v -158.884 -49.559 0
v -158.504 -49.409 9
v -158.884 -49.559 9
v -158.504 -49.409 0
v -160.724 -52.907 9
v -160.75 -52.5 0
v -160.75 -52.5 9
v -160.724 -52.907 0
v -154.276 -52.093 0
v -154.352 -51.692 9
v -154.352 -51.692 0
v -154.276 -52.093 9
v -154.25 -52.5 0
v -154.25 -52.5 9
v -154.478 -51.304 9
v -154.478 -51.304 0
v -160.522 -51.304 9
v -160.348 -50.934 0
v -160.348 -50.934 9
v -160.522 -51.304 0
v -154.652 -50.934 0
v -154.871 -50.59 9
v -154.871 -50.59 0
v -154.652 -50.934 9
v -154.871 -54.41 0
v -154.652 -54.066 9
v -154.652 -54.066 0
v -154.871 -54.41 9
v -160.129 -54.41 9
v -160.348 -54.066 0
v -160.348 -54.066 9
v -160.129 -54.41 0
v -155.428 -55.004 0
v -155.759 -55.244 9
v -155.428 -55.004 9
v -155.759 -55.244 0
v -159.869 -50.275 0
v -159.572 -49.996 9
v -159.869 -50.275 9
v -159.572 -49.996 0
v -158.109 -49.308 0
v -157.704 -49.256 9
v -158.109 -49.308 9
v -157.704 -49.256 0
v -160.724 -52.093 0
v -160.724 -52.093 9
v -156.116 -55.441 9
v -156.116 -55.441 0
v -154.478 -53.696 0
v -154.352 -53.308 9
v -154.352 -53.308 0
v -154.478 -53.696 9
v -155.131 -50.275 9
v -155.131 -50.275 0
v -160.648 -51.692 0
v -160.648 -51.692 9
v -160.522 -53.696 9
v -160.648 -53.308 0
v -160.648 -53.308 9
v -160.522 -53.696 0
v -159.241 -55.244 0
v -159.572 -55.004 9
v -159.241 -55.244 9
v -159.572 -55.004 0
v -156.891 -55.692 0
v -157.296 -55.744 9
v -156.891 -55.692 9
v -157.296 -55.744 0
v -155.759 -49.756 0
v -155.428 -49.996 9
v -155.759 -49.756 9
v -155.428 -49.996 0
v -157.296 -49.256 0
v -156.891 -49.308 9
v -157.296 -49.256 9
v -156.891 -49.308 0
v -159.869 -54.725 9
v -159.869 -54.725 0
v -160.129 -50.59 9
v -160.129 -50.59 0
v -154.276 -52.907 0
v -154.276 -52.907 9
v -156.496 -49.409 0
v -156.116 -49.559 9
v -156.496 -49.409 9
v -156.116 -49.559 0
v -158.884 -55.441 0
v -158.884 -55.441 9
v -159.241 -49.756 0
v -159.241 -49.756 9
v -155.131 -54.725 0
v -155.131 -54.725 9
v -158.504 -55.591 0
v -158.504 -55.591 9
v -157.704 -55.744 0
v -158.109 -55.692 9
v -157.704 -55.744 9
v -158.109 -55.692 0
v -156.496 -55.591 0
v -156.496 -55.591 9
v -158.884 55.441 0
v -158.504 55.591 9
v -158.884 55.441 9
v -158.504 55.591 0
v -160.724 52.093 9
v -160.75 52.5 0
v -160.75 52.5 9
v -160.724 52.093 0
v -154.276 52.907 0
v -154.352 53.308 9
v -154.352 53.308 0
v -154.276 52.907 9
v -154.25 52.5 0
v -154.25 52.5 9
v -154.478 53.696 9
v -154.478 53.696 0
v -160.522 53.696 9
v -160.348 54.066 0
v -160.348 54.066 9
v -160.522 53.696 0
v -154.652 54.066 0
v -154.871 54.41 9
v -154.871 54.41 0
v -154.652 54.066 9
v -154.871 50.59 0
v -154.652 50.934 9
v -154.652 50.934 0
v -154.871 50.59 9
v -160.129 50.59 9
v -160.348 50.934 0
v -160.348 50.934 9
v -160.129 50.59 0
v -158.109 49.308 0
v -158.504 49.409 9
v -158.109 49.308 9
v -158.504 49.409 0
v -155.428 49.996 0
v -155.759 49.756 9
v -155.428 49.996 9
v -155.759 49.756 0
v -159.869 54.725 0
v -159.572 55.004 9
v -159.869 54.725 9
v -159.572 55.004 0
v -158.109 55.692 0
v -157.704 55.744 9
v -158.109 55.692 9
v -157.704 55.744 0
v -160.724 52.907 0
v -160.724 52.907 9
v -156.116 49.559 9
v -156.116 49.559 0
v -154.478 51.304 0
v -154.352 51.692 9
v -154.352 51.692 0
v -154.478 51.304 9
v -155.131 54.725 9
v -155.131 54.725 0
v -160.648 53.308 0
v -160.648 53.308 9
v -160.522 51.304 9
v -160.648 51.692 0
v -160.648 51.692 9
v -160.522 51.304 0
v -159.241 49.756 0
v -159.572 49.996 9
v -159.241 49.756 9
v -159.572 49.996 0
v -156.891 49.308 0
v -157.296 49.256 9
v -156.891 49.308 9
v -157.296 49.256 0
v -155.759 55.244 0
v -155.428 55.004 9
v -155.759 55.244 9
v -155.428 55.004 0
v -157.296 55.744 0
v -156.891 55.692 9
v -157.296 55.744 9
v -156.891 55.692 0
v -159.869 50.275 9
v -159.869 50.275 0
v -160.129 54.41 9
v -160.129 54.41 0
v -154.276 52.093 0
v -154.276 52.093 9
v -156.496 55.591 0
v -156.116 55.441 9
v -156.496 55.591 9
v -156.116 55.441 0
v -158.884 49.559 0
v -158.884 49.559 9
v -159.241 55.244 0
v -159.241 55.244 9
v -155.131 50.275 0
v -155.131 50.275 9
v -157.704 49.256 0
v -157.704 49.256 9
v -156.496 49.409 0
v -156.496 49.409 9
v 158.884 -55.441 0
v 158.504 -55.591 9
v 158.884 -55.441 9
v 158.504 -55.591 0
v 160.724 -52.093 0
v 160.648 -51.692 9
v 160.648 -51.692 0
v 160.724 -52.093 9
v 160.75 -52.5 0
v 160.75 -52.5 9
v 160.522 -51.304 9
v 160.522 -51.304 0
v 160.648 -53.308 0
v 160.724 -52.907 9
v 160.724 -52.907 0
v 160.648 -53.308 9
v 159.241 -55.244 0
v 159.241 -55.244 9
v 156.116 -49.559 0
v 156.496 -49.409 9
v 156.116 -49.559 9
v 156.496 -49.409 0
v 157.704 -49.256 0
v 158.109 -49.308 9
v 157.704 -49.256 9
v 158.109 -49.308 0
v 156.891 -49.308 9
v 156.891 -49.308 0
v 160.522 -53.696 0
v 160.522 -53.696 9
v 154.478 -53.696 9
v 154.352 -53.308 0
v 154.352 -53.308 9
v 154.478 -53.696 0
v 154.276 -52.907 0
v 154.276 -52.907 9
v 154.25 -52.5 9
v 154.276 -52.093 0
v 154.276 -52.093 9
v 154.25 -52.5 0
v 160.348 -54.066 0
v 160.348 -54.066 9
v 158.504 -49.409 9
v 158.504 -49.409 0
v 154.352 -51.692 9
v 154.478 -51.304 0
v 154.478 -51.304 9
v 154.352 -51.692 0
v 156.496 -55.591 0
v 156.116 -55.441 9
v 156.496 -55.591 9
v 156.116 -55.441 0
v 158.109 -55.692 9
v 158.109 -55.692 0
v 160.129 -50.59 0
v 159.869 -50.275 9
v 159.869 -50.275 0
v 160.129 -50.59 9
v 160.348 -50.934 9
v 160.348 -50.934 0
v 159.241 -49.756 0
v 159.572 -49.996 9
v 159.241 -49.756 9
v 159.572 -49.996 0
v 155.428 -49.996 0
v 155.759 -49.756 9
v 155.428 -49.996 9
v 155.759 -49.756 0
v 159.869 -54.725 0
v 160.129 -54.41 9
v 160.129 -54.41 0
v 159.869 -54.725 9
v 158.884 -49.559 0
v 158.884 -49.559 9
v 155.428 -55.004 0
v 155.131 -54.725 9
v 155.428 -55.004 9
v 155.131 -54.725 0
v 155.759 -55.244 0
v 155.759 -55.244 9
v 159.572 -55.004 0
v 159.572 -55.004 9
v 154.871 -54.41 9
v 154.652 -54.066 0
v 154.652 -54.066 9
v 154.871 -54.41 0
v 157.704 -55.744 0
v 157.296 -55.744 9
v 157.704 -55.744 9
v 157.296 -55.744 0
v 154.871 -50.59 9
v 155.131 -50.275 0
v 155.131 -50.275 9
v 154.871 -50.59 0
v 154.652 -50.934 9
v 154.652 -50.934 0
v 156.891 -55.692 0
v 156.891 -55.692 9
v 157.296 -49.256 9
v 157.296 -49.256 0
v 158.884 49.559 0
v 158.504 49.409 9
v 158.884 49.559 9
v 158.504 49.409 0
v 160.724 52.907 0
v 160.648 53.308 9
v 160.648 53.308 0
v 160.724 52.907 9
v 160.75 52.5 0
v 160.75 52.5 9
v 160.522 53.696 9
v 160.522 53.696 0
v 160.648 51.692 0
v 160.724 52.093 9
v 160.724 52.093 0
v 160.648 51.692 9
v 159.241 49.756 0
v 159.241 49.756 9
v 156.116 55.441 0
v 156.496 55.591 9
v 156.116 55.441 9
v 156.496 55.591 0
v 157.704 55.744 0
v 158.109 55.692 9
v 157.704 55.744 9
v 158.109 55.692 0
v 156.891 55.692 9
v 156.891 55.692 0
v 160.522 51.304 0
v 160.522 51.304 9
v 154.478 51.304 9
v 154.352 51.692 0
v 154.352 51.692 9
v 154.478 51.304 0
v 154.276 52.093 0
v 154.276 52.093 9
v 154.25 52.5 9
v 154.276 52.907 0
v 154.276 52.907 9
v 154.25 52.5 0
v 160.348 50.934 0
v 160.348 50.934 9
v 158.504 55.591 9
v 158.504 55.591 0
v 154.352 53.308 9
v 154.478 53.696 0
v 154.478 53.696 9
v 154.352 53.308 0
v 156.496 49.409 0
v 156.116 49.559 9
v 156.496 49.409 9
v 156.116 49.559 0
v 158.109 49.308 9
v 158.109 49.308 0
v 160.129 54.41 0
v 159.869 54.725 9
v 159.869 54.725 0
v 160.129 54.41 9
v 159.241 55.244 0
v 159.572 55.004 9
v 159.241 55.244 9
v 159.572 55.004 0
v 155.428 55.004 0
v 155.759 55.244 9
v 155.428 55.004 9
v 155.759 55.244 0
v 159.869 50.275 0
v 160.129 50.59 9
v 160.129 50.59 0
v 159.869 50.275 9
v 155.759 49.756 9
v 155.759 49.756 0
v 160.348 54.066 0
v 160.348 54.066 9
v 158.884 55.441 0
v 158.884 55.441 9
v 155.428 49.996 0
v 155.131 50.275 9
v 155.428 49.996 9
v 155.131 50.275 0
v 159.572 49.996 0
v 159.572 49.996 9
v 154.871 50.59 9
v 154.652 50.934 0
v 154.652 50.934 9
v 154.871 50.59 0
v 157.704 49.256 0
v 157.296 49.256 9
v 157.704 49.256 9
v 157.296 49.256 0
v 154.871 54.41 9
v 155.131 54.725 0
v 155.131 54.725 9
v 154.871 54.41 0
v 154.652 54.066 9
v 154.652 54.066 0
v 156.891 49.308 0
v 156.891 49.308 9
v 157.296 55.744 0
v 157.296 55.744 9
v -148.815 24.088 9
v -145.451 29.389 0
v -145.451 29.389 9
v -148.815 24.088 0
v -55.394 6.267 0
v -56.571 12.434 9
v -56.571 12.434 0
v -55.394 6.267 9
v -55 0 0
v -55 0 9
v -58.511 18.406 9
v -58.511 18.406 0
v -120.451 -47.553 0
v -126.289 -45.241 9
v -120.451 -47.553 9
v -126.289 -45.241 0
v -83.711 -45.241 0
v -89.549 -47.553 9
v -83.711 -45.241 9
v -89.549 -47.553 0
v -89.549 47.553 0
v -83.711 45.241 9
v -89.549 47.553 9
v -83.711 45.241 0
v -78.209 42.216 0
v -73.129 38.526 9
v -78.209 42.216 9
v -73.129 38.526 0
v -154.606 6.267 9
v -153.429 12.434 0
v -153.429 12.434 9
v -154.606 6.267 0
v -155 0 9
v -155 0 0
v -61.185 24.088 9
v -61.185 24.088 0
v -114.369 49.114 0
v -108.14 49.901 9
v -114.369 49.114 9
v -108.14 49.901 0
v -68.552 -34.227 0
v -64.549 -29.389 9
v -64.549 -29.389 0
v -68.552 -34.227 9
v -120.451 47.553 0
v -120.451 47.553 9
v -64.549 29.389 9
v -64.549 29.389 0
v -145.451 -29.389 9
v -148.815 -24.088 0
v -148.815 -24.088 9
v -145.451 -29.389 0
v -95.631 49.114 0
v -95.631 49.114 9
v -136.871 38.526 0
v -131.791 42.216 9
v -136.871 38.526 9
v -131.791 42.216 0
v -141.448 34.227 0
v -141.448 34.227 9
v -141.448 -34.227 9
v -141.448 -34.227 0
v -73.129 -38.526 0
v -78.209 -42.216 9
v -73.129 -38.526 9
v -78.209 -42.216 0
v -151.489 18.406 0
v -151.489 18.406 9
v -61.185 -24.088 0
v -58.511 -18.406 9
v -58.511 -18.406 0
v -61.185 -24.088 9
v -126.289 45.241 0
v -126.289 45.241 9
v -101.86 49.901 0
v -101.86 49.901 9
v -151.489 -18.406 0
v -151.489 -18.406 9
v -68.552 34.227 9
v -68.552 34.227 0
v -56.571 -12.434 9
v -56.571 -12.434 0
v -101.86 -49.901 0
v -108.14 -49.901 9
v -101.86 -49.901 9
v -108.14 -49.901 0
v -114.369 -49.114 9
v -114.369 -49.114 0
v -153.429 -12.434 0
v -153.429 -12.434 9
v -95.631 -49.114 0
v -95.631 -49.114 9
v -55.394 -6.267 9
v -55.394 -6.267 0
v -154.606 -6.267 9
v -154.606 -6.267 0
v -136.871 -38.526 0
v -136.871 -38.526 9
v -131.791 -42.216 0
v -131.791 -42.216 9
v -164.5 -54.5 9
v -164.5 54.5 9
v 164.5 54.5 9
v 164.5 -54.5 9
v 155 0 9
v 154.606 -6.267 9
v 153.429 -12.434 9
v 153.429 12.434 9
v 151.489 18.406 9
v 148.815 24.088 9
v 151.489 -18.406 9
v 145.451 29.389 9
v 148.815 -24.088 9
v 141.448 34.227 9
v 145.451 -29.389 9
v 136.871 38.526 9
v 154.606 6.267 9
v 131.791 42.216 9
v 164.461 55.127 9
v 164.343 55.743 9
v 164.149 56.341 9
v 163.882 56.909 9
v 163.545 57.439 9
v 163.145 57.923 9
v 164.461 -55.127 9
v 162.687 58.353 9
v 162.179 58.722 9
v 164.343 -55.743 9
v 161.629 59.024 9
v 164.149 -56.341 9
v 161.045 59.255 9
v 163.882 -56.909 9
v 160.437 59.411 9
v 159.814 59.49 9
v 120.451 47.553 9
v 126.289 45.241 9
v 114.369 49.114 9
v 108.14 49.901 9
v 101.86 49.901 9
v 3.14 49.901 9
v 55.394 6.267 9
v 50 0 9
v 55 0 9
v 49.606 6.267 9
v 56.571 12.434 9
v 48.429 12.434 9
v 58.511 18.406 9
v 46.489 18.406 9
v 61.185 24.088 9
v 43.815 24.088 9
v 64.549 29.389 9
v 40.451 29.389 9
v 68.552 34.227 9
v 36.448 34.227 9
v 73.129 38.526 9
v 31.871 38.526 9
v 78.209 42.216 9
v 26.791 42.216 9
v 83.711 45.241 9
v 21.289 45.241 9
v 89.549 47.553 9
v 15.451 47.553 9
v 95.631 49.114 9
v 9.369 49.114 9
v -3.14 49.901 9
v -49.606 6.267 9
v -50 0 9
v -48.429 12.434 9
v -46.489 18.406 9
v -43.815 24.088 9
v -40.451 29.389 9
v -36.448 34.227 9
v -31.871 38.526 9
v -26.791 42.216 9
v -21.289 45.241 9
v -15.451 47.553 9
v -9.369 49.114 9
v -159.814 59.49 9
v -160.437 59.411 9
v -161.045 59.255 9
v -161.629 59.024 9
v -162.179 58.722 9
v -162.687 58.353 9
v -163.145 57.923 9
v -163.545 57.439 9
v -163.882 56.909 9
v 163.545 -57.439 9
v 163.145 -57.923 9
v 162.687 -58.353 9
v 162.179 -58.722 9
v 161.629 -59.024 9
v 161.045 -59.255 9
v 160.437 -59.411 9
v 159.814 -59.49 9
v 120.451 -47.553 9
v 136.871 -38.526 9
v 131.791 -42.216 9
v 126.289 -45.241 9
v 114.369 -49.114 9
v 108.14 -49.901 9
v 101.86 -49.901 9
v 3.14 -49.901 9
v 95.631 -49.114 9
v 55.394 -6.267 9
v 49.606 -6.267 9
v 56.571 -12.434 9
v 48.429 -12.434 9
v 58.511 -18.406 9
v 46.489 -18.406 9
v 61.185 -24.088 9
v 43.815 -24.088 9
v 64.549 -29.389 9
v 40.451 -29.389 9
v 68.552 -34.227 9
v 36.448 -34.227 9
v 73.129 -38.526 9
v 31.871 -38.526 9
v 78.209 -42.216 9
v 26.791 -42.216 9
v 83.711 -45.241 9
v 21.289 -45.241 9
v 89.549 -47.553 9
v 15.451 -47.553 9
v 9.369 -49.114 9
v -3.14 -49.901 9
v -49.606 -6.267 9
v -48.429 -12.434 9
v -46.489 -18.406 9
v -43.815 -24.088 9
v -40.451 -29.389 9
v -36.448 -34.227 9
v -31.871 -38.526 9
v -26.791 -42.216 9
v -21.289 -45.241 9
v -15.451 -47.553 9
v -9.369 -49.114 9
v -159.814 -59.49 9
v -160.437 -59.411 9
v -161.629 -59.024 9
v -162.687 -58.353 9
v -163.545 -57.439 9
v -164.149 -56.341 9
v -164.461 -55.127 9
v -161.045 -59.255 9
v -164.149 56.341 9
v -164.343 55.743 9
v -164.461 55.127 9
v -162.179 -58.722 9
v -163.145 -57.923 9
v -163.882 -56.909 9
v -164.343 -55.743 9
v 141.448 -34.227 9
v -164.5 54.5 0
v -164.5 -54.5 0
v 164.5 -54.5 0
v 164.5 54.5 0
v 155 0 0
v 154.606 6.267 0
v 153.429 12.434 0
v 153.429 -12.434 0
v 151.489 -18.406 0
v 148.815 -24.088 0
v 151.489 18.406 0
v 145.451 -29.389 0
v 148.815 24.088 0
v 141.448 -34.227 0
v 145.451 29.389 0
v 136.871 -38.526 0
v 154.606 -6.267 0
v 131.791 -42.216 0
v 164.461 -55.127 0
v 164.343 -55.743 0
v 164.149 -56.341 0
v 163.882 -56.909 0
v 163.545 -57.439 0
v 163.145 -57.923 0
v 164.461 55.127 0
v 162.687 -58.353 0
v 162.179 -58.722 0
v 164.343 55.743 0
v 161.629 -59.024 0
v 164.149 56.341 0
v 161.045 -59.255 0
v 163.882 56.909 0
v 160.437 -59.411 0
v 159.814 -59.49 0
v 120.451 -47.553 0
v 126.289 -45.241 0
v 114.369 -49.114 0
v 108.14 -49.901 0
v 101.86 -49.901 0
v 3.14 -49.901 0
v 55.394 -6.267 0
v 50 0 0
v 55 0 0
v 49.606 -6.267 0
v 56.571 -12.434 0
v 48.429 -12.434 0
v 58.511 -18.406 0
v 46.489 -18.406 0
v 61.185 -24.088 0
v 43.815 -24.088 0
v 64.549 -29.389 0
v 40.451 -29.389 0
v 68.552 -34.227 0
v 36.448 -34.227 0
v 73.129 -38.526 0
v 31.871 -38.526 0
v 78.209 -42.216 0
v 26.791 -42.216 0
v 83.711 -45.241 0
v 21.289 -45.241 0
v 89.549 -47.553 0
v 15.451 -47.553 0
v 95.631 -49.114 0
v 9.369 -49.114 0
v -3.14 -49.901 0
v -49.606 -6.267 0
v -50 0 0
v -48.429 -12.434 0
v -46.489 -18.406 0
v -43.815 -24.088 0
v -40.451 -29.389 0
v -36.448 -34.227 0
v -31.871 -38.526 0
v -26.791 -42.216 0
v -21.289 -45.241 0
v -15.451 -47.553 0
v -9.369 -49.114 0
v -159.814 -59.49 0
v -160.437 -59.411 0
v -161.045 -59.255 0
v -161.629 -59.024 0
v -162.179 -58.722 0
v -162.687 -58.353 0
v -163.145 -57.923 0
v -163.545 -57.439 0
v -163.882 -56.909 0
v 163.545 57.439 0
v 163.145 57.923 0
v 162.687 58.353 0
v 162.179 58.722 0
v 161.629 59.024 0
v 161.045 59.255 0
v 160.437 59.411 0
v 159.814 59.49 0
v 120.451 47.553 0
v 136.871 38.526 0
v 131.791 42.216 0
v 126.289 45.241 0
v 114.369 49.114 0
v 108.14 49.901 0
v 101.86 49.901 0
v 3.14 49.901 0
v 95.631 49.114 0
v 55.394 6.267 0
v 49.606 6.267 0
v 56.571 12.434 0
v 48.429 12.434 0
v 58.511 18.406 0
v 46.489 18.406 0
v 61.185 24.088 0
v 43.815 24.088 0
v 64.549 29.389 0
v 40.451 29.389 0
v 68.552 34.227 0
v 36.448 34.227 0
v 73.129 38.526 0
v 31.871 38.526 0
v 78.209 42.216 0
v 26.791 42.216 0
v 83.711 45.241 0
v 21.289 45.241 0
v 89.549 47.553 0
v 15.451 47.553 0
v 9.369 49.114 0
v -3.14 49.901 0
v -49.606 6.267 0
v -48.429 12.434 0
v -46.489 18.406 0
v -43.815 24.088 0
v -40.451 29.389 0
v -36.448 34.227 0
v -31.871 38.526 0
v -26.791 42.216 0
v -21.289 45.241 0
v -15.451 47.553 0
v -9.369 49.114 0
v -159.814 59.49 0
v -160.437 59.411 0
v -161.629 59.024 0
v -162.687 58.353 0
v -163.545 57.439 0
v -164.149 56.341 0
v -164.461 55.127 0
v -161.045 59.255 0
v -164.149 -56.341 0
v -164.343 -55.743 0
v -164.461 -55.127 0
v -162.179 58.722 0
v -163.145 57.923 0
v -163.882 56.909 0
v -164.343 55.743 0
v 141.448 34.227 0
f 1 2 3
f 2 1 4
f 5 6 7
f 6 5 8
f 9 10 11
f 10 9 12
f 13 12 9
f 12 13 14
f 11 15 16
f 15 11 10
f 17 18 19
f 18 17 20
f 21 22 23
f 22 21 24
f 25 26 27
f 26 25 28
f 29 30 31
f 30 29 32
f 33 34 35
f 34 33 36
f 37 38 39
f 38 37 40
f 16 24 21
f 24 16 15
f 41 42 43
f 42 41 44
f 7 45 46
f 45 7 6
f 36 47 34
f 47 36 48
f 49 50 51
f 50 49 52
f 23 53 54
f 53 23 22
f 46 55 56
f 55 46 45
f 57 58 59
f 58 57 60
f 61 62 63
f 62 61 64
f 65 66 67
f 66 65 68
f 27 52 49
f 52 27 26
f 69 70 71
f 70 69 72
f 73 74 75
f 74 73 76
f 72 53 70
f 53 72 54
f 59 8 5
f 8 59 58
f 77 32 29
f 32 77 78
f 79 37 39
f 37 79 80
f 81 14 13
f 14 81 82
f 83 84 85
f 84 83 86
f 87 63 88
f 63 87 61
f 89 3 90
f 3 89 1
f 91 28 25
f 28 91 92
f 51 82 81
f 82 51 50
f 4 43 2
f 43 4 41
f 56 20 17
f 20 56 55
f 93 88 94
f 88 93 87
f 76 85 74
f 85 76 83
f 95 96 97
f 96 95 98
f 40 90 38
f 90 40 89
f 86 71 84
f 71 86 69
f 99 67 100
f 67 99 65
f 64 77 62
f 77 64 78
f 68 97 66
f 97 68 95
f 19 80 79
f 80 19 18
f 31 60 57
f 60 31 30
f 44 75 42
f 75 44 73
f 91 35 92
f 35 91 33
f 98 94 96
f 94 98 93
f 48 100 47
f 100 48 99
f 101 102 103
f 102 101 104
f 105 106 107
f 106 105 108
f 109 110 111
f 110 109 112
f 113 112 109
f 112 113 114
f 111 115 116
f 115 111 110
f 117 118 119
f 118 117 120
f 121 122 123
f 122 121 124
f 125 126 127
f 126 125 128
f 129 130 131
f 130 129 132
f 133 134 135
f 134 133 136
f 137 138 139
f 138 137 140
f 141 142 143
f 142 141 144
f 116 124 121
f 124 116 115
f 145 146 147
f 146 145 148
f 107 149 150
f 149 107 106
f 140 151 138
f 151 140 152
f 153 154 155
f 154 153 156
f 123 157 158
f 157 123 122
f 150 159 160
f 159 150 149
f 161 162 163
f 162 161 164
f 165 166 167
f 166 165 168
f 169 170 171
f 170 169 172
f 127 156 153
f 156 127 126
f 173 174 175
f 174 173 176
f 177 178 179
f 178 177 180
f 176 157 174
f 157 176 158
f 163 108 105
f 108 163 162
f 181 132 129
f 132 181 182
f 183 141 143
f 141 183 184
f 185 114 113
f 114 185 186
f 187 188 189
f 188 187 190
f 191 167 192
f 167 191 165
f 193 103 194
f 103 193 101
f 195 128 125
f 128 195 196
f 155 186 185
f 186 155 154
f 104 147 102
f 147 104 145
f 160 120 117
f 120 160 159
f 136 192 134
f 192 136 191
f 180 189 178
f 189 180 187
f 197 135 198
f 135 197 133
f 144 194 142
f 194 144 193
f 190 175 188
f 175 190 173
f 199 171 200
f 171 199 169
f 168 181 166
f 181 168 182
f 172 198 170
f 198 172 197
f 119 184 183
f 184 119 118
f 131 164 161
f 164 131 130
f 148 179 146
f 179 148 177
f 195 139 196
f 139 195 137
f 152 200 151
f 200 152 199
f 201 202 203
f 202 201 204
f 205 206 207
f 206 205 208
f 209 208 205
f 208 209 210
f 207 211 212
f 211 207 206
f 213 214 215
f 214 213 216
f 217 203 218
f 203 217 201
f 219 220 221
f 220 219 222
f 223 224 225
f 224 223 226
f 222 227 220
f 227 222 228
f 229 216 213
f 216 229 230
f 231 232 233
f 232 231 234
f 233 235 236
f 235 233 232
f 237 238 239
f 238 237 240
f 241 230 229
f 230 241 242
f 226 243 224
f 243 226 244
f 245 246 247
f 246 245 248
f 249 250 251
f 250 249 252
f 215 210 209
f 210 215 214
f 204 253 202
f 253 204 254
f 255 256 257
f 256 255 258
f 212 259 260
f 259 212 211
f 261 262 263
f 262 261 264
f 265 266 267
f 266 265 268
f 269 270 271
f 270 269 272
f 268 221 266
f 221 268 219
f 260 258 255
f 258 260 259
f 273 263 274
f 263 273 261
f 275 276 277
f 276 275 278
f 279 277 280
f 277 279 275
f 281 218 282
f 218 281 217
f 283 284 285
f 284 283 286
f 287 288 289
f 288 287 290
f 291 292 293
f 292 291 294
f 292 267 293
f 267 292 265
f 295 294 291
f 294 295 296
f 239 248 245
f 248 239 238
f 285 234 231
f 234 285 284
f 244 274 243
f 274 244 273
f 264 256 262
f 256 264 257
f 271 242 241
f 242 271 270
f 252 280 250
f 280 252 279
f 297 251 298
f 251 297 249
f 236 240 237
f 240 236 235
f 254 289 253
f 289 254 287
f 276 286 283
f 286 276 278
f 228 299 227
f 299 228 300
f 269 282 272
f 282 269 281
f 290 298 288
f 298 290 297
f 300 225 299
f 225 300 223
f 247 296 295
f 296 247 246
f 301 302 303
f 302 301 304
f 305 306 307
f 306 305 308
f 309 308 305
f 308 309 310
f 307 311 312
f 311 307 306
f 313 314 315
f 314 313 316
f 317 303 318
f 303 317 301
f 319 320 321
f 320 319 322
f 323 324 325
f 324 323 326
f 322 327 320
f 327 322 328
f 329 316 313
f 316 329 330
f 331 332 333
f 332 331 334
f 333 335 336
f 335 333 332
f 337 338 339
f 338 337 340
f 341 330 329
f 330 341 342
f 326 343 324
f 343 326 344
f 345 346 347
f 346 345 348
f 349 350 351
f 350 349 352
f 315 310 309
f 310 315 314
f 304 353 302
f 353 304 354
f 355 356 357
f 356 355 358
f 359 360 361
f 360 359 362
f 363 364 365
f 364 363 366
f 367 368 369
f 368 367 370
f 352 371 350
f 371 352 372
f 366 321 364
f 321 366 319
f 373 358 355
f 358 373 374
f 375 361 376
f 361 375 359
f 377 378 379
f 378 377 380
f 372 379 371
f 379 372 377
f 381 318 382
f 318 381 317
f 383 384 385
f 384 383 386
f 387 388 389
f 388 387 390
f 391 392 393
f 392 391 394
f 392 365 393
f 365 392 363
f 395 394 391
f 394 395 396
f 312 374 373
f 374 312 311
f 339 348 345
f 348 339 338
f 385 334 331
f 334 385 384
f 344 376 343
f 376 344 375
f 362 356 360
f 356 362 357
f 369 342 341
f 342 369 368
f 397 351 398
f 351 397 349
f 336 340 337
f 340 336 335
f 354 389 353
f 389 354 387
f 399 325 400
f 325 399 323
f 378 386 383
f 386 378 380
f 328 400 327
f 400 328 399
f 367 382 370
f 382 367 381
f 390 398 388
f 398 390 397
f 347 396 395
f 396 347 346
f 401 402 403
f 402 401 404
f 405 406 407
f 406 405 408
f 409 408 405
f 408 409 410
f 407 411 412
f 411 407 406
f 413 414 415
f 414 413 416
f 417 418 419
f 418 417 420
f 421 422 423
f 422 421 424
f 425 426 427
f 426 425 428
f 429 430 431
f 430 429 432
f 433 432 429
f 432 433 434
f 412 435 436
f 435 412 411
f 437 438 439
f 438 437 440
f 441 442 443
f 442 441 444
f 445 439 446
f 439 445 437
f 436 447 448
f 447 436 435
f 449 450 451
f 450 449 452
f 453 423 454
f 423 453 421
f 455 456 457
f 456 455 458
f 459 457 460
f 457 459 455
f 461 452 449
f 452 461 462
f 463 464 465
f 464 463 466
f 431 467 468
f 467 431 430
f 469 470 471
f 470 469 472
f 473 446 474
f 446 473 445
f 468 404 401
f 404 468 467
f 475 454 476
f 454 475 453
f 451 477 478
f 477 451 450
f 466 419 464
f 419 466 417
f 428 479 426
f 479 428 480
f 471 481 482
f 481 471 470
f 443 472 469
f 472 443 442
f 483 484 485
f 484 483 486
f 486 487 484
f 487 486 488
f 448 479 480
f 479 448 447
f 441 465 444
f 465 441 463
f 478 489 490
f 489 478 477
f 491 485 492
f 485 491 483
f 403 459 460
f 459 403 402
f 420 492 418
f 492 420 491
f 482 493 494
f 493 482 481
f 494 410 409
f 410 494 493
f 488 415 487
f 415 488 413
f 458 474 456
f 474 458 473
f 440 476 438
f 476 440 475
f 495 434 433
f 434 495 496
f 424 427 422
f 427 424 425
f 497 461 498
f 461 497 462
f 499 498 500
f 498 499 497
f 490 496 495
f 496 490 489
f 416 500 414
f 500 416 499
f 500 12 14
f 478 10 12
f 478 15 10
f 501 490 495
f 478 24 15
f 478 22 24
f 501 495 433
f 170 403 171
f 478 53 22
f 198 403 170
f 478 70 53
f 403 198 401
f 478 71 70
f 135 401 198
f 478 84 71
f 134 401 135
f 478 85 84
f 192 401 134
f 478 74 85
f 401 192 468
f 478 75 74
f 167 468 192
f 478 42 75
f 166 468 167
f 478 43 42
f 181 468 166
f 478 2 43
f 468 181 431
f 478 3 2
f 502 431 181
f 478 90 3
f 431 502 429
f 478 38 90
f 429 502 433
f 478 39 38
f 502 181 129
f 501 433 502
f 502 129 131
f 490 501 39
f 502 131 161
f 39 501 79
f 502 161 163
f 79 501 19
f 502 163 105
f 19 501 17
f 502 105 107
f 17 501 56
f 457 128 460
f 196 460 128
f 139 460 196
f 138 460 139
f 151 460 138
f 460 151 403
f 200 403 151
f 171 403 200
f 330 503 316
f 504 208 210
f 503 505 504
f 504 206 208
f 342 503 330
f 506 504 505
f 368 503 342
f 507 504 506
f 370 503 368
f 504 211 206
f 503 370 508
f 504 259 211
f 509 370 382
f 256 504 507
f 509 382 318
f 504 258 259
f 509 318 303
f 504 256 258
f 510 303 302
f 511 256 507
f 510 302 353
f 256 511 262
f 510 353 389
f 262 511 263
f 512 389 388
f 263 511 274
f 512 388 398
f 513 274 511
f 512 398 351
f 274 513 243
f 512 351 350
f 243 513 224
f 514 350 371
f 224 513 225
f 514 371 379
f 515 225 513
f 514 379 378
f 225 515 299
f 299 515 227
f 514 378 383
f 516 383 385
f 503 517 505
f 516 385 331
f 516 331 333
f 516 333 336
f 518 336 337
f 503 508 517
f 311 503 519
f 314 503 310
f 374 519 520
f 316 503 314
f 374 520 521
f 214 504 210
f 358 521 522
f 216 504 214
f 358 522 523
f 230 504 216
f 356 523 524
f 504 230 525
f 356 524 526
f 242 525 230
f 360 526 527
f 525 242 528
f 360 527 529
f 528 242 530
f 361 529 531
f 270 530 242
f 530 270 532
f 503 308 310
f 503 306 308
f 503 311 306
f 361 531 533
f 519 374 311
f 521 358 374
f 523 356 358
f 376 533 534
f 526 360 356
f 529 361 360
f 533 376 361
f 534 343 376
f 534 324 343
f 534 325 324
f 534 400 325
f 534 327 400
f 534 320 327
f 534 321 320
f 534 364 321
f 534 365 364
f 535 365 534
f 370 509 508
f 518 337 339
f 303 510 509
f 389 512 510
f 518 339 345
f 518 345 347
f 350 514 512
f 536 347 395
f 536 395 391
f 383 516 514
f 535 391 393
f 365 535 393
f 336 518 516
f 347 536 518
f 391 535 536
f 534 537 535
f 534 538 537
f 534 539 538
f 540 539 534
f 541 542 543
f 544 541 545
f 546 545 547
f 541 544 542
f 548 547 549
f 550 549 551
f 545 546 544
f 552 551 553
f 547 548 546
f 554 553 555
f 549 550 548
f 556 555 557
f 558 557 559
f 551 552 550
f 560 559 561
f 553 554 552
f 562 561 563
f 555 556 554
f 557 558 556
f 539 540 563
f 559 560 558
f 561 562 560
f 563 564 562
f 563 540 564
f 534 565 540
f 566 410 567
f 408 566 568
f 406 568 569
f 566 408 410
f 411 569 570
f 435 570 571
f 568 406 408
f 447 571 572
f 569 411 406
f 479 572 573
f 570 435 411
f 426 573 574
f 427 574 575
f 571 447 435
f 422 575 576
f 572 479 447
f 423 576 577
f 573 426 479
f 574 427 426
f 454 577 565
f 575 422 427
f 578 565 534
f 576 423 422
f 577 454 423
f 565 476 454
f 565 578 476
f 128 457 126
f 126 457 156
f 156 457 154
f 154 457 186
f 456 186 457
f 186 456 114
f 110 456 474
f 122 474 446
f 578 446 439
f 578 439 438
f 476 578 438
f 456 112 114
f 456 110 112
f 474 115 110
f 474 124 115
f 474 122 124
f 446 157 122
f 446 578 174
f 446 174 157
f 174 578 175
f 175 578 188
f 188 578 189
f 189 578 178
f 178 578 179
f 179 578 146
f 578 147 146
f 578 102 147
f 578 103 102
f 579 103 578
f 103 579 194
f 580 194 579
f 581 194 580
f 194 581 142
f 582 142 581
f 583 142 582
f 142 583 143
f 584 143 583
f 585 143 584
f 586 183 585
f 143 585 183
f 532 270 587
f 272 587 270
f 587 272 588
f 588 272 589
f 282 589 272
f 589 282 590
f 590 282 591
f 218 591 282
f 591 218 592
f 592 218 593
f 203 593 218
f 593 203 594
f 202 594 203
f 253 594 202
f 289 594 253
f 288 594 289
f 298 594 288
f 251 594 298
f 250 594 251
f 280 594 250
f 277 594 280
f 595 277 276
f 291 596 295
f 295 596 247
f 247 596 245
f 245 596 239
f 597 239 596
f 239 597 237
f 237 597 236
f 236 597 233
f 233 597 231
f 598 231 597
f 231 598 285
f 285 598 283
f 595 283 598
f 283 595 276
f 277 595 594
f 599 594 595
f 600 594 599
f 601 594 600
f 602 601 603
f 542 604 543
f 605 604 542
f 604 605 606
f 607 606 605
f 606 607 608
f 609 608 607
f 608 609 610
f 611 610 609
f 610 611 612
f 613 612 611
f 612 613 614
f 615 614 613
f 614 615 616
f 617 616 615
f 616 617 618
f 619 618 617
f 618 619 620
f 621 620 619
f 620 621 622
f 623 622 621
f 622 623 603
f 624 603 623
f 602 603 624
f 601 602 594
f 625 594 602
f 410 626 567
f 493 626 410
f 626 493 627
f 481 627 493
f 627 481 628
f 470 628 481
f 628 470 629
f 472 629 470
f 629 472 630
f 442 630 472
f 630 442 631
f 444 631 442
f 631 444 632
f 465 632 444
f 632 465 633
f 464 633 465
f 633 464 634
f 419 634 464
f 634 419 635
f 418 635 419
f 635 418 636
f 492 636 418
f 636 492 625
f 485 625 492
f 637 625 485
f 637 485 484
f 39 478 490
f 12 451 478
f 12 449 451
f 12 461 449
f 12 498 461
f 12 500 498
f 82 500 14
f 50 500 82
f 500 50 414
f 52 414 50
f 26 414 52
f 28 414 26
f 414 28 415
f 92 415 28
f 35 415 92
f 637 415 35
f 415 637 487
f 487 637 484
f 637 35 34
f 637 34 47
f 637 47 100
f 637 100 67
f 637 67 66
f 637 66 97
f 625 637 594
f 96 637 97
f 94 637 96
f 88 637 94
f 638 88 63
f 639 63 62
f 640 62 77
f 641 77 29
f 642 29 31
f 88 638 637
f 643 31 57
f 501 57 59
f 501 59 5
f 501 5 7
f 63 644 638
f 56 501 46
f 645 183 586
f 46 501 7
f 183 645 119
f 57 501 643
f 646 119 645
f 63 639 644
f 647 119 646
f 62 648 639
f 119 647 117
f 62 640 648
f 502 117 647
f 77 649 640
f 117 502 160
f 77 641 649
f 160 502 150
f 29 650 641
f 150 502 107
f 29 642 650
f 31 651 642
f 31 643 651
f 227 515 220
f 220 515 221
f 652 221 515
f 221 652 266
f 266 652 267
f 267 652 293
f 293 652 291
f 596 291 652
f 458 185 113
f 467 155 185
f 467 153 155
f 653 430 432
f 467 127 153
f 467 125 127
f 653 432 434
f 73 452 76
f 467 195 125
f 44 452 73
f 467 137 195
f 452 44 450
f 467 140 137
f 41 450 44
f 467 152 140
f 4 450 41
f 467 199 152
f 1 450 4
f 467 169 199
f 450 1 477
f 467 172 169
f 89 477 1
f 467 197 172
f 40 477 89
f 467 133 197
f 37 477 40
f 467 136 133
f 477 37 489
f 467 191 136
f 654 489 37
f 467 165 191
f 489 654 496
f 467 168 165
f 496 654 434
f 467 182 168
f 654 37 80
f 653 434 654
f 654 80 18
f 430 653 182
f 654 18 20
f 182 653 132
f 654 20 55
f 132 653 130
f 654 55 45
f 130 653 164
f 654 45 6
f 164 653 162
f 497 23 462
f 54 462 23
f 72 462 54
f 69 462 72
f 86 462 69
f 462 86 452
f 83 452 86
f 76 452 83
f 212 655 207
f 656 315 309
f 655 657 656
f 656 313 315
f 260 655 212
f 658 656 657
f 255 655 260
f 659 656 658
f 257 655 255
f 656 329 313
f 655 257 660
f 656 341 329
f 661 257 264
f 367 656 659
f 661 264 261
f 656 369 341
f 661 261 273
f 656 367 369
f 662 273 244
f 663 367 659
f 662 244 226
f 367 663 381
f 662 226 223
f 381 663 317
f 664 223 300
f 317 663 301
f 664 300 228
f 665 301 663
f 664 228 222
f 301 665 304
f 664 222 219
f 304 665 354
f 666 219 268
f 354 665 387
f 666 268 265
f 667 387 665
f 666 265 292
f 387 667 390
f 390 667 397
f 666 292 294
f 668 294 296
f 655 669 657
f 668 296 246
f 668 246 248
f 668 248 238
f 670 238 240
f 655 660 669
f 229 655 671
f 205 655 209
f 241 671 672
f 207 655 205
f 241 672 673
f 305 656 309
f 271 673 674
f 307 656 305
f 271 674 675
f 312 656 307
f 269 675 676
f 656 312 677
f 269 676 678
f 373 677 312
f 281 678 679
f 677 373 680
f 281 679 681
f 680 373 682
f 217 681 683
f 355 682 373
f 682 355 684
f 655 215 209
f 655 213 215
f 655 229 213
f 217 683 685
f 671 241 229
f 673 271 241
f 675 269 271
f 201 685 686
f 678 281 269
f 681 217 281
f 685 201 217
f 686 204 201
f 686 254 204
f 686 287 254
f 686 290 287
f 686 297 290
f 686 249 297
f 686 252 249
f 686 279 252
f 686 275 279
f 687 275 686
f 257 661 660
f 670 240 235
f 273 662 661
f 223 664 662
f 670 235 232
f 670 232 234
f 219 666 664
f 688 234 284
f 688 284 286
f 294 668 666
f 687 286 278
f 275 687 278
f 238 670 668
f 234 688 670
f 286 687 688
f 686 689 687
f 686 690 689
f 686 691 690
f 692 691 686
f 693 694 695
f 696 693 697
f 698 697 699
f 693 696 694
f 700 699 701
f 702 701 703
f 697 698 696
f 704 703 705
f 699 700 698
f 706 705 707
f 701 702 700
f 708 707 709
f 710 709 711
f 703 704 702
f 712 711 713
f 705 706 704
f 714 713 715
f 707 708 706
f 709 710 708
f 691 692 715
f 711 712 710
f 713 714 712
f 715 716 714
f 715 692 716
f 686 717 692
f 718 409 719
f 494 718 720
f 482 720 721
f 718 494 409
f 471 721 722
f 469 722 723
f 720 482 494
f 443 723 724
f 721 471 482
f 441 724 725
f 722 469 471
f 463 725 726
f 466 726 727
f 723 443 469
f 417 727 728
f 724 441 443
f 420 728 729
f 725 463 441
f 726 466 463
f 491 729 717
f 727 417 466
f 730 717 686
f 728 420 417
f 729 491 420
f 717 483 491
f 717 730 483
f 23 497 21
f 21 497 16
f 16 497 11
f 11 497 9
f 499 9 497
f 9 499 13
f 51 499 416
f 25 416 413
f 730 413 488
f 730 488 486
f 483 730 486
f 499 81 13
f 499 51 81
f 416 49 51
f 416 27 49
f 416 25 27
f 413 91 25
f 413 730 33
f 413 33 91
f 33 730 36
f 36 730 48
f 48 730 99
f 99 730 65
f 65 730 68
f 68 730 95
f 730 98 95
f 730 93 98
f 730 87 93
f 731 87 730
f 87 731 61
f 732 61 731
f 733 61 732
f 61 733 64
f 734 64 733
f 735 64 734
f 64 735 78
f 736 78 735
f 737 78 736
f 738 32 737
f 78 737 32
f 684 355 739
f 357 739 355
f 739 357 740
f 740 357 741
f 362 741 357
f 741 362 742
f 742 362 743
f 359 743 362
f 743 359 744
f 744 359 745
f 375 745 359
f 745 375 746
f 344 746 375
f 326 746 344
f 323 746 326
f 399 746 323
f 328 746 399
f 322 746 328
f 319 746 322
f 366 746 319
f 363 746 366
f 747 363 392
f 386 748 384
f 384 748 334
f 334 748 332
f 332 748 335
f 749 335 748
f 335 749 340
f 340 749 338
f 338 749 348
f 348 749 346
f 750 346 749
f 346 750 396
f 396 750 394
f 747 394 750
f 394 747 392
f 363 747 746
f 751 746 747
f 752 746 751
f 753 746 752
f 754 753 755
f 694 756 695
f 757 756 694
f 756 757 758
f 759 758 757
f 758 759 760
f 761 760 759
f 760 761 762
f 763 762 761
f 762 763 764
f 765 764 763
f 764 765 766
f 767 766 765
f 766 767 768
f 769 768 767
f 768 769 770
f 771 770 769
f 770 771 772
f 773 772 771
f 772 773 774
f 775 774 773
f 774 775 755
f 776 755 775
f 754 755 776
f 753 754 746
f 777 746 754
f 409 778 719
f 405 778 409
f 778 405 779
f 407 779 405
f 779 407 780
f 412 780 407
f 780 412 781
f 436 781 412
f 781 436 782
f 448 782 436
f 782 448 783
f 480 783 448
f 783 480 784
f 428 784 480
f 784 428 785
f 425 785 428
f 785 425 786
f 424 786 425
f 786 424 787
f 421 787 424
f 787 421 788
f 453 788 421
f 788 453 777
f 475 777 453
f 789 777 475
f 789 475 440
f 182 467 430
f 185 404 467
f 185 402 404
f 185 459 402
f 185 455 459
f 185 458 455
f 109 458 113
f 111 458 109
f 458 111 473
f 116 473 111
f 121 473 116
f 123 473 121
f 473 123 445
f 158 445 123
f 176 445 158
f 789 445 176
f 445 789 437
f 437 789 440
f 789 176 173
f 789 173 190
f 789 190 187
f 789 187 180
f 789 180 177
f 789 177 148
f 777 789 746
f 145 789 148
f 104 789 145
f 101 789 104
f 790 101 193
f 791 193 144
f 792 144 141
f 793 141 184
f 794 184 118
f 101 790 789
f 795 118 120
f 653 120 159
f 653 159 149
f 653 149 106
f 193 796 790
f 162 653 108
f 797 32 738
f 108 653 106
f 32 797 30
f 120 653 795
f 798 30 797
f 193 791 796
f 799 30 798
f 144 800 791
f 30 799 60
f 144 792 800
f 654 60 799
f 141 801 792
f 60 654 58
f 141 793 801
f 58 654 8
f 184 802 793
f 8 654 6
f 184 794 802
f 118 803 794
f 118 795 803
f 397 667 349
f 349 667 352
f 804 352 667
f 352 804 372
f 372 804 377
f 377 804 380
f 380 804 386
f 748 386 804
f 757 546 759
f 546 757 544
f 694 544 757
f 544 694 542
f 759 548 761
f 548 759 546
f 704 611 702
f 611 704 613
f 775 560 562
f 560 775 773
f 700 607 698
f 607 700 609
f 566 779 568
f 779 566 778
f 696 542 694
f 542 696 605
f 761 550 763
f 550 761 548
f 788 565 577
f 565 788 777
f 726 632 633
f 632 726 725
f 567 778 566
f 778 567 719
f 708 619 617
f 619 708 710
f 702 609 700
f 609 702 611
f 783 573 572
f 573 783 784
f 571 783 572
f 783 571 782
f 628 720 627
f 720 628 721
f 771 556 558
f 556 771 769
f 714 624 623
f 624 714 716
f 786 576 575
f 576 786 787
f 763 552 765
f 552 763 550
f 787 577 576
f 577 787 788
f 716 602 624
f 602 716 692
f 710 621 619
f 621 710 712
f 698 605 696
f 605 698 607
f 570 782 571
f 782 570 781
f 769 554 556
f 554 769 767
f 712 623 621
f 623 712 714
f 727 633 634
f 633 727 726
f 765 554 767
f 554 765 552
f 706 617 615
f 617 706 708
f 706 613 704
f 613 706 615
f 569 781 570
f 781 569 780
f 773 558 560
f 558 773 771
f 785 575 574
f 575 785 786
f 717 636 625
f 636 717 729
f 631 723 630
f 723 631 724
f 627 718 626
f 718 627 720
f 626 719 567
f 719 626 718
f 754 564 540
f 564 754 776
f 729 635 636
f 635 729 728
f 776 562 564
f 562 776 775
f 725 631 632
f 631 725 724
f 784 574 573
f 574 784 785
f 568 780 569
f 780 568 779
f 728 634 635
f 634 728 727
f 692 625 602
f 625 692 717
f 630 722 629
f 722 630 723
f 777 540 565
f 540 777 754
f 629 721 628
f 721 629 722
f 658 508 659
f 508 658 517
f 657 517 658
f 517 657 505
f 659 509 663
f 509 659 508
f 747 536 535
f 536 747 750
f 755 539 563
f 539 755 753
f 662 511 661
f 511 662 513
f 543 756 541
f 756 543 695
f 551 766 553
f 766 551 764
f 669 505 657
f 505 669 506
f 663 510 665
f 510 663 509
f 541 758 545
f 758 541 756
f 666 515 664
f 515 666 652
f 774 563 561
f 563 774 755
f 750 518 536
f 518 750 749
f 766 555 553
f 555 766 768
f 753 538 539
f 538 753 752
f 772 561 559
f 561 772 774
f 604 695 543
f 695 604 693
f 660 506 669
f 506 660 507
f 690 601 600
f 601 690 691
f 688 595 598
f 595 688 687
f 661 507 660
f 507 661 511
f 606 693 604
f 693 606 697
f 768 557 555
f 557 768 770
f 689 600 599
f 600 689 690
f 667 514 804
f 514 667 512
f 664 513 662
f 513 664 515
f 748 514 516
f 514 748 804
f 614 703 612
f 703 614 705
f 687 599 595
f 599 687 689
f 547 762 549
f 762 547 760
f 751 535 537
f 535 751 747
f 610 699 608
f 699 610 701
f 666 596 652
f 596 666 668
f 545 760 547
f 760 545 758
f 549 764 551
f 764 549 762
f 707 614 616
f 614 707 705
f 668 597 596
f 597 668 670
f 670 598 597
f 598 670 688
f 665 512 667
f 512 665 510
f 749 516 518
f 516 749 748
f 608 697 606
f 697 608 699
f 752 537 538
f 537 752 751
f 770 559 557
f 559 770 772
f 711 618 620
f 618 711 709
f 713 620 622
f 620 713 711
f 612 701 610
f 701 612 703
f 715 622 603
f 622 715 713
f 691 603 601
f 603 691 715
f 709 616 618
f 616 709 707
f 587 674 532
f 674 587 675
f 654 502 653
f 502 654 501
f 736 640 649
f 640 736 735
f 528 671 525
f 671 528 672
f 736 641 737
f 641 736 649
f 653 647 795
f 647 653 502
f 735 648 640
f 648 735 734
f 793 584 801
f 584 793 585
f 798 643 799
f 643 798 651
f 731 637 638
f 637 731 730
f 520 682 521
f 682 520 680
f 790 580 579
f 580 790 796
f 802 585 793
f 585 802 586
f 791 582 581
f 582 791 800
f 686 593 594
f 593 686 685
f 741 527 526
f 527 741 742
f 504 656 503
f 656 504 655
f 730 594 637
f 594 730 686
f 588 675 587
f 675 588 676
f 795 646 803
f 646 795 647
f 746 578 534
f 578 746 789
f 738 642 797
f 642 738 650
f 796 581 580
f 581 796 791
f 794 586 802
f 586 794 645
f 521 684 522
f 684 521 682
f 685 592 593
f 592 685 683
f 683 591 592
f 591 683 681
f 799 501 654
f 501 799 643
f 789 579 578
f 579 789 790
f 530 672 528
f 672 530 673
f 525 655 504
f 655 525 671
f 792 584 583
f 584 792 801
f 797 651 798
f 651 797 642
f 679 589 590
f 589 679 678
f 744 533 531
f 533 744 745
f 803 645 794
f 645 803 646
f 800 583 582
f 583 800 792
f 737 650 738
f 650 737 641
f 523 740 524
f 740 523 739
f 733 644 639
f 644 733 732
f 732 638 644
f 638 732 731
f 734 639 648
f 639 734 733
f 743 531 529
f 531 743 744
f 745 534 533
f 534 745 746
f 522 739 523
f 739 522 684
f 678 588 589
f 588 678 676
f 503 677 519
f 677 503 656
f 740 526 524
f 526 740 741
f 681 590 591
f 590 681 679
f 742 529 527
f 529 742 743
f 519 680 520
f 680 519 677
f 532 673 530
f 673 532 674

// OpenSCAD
$fn = 50;


difference() {
	union() {
		hull() {
			translate(v = [-159.5000000000, 54.5000000000, 0]) {
				cylinder(h = 9, r = 5);
			}
			translate(v = [159.5000000000, 54.5000000000, 0]) {
				cylinder(h = 9, r = 5);
			}
			translate(v = [-159.5000000000, -54.5000000000, 0]) {
				cylinder(h = 9, r = 5);
			}
			translate(v = [159.5000000000, -54.5000000000, 0]) {
				cylinder(h = 9, r = 5);
			}
		}
	}
	union() {
		#translate(v = [-157.5000000000, -52.5000000000, -100.0000000000]) {
			cylinder(h = 200, r = 3.2500000000);
		}
		#translate(v = [-157.5000000000, 52.5000000000, -100.0000000000]) {
			cylinder(h = 200, r = 3.2500000000);
		}
		#translate(v = [157.5000000000, -52.5000000000, -100.0000000000]) {
			cylinder(h = 200, r = 3.2500000000);
		}
		#translate(v = [157.5000000000, 52.5000000000, -100.0000000000]) {
			cylinder(h = 200, r = 3.2500000000);
		}
		#translate(v = [-105.0000000000, 0, 0]) {
			cylinder(h = 9, r = 50.0000000000);
		}
		#cylinder(h = 9, r = 50.0000000000);
		#translate(v = [105.0000000000, 0, 0]) {
			cylinder(h = 9, r = 50.0000000000);
		}
	}
}
